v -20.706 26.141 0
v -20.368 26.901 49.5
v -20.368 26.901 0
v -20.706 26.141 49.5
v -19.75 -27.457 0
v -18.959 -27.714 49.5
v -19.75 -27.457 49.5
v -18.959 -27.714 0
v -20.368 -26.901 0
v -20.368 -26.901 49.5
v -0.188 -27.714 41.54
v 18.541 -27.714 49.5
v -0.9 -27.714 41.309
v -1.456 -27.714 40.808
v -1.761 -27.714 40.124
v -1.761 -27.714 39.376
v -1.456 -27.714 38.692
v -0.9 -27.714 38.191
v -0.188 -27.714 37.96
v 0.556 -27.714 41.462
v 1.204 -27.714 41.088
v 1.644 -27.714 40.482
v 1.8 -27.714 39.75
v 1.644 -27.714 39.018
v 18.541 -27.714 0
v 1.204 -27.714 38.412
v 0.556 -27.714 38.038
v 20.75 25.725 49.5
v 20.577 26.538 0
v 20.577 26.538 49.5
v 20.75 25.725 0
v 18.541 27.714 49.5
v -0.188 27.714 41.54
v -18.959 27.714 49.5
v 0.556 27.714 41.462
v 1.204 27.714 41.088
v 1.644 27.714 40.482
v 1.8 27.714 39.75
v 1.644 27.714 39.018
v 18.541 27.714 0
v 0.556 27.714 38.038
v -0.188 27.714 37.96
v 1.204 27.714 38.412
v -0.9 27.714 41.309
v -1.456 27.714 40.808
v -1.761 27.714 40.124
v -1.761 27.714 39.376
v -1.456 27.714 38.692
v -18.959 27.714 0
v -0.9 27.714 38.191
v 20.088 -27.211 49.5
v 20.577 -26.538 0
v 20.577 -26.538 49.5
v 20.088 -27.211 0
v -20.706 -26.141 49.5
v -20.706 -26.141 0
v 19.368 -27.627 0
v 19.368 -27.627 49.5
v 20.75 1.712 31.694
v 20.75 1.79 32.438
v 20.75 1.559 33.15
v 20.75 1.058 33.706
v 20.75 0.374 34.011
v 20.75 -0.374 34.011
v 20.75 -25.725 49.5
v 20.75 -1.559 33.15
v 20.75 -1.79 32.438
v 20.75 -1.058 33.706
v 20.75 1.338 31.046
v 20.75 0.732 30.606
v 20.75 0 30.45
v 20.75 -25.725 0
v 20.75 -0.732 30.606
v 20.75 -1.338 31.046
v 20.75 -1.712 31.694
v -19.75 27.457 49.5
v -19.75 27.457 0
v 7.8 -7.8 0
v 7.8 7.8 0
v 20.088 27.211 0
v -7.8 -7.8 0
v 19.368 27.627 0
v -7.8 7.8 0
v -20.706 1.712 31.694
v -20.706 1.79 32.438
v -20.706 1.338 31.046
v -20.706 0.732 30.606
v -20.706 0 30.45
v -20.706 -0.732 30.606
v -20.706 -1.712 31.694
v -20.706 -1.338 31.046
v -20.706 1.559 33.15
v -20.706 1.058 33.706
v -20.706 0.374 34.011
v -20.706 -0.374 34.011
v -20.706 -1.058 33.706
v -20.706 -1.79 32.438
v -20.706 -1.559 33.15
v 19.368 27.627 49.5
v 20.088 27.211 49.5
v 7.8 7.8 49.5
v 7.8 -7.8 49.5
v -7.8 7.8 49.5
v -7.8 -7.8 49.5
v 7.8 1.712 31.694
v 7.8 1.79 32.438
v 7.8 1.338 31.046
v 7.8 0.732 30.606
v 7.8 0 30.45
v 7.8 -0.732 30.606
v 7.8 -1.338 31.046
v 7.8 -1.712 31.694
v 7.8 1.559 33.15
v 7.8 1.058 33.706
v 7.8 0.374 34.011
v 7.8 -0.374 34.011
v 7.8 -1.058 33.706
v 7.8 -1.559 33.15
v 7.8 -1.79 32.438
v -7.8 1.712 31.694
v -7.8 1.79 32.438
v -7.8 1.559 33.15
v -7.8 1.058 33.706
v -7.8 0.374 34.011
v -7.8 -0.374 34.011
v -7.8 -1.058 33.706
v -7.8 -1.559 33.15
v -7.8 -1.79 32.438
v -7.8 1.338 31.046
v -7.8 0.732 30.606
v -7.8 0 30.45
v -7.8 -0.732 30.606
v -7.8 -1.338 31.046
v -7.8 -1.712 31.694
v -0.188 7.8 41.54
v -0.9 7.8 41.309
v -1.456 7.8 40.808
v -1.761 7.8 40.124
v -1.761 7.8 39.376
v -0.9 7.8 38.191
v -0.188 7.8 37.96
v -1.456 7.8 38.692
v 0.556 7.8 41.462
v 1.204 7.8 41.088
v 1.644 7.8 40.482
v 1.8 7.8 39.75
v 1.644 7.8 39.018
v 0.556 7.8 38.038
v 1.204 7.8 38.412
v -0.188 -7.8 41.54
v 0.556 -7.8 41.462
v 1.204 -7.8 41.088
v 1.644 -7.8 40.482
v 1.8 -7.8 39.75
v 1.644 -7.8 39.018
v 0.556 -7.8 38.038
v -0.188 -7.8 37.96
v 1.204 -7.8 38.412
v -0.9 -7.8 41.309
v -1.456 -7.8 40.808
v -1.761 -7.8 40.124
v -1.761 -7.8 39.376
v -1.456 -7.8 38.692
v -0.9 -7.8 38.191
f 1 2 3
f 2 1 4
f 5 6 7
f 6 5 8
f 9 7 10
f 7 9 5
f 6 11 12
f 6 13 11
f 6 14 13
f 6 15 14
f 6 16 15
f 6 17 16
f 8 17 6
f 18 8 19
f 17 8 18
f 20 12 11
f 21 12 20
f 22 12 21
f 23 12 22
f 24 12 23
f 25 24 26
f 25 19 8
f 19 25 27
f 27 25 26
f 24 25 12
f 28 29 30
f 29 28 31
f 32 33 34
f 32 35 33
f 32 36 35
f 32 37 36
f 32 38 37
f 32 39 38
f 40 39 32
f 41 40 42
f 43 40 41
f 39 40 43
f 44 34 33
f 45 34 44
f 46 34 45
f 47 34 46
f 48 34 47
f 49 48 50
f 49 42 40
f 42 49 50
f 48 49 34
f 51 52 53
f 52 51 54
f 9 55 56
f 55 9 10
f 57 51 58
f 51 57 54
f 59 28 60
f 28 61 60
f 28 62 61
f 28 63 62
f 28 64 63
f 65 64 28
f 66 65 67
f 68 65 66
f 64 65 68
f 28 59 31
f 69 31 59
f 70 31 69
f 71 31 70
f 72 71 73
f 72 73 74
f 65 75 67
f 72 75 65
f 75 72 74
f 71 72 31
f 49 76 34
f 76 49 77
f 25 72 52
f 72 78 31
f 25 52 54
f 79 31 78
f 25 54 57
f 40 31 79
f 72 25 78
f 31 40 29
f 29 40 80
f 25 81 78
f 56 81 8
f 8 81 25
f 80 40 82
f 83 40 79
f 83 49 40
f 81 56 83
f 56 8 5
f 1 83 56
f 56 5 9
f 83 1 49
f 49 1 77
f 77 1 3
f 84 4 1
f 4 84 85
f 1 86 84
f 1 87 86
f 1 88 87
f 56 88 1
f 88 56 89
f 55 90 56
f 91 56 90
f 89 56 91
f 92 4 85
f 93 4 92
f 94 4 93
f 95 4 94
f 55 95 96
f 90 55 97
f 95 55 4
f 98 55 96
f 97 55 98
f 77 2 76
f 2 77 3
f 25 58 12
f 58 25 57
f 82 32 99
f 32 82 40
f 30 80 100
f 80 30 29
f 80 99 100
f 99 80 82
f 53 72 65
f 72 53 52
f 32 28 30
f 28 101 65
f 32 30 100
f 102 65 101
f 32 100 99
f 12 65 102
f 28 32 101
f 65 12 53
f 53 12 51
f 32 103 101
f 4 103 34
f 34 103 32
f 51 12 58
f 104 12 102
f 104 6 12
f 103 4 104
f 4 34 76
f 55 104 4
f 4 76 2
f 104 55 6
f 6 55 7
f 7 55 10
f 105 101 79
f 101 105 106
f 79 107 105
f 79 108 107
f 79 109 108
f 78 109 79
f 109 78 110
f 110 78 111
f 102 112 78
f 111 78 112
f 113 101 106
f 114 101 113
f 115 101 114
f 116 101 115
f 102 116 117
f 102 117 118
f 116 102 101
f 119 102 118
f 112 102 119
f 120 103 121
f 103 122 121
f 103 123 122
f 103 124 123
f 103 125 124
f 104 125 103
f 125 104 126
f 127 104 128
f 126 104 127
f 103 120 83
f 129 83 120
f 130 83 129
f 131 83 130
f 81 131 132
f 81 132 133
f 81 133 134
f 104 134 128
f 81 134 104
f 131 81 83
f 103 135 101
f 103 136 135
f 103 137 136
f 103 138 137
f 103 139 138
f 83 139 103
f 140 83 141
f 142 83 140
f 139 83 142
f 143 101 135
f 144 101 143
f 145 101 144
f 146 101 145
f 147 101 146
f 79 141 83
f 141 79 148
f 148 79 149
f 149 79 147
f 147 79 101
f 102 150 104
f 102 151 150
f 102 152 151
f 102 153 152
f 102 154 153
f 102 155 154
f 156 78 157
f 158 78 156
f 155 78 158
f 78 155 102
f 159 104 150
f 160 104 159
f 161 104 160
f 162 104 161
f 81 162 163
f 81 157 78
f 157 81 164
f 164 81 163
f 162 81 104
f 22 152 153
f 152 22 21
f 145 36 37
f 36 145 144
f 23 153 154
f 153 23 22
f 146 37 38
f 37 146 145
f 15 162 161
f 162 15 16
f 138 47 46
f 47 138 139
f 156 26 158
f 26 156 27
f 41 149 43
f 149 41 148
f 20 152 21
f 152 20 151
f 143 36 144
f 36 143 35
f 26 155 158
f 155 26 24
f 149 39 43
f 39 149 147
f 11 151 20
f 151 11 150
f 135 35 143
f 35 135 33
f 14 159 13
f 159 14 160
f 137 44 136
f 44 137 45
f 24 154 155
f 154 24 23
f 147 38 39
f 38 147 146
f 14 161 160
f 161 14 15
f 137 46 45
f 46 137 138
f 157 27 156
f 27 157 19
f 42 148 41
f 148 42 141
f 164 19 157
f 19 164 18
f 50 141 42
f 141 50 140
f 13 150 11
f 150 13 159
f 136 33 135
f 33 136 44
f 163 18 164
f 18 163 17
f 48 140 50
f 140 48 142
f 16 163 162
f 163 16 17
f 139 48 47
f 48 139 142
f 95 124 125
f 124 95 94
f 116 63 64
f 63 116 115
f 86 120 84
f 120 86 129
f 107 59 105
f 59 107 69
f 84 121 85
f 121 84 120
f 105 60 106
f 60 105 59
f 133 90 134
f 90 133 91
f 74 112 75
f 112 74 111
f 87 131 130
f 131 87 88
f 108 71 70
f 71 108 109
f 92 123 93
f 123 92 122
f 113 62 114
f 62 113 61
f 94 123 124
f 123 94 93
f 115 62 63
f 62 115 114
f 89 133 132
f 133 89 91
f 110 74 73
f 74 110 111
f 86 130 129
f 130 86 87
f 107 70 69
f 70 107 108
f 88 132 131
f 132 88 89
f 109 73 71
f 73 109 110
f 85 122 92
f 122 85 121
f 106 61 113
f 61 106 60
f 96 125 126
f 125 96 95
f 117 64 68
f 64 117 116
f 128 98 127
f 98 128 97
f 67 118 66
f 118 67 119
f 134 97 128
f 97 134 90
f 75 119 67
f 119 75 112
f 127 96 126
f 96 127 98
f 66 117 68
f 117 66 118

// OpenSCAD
open_beam = 15; //open beam dimensions (square)
perspex_width = 5;
bearing_od = 22;
bearing_id = 8;
hole_space = 65.673;//hole spacing on perspex round plate
hole_to_front_edge = 13;
r_corners = 3;
plate_thickness = 4;
extrusion=0.3;

//variables for thingiverse obtained cylinder rounding tool
pad = 0.1;	// Padding to maintain manifold
ch = 15;
cr = 25;
ct = 1;
r = 10;
smooth = 180;	// Number of facets of rounding cylinder
//variables for edge fillet
b = 13;
h = 20;
w = 90*0.5888888+r_corners;

//===========================================================================================
//===========================================================================================

module plate_fixture(length, thickness){
	difference(){
		hull(){
			translate([length/2, (length*0.5888)/2, 0])cylinder(r=r_corners, h=thickness, $fn=15);
			translate([-length/2, (length*0.5888)/2, 0])cylinder(r=r_corners, h=thickness, $fn=15);
			translate([-(length*0.722)/2, -(length*0.5888)/2, 0])cylinder(r=r_corners, h=thickness, $fn=15);
			translate([(length*0.722)/2, -(length*0.5888)/2, 0])cylinder(r=r_corners, h=thickness, $fn=15);

		}
		union(){
			translate([(hole_space)/2-1.6, (length*0.5888)/2-13+r_corners, -1])cylinder(r=1.6+extrusion, h=thickness+2, $fn=15);
			translate([(-hole_space)/2+1.6, (length*0.5888)/2-13+r_corners, -1])cylinder(r=1.6+extrusion, h=thickness+2, $fn=15);
			translate([(hole_space)/2-1.6, -(length*0.5888)/2+13-r_corners, -1])cylinder(r=1.6+extrusion, h=thickness+2, $fn=15);
			translate([(-hole_space)/2+1.6, -(length*0.5888)/2+13-r_corners, -1])cylinder(r=1.6+extrusion, h=thickness+2, $fn=15);
		}
	}
}
//===========================================================================================
//===========================================================================================
module bearing_slot(od, id, width, length){
	rotate([90,0,0])
	translate([0, -plate_thickness/2, -(length*0.5888)/2-r_corners])
	//difference(){
		cylinder(d=od+extrusion*2.5, h=width*2+1);
		//cylinder(d=id, h=width);
	//}
}
//===========================================================================================
//===========================================================================================
module reinforcement(length){
	rotate([90,0,0])
	translate([0, -plate_thickness/2, -(length*0.5888)/2-r_corners])
	cylinder(r=23.5, h=(length*0.5888)+2*r_corners);
	}
//===========================================================================================
//===========================================================================================
module top_half(){
translate([0, 0, -100])
cube(size=[200, 200, 200], center=true);

}
//===========================================================================================
//===========================================================================================
module bot_half(){
translate([0, 0, 100])
cube(size=[200, 200, 200], center=true);

}
//===========================================================================================
//===========================================================================================
module cylinder_fillet(){
	// Inside Fillet
	translate([0, -90*0.65/2, 0])
	rotate([-90, 0, 0])
	difference() {
		rotate_extrude(convexity=10,  $fn = smooth)
			translate([cr-ct-r+pad,ct-pad,0])
				square(r+pad,r+pad);
		rotate_extrude(convexity=10,  $fn = smooth)
			translate([cr-ct-r,ct+r,0])
				circle(r=r,$fn=smooth);
	}


}
//===========================================================================================
//===========================================================================================
module open_beam_slot(ob_dim, ob_h){//open beam fixture on lower bearing lock (ob_dim = width and length of open beam extrusion)
	translate([0, 0, ob_dim/2*ob_h])
	difference(){
		difference(){
			translate([-(ob_dim+ob_dim/3*2)/2, -(ob_dim+ob_dim/3*2)/2, 0])
			minkowski(){
				cube([ob_dim+ob_dim*1.5, ob_dim+ob_dim*2.43, ob_dim*ob_h], center = true);
				translate([(ob_dim+ob_dim/3*2)/2, (ob_dim+ob_dim/3*2)/2, 0])cylinder(r=2, h=0.000005, center = true, $fn=15);
			}
			cube([ob_dim+extrusion*2, ob_dim+extrusion*2, ob_dim*ob_h+3], center=true);
		}
		
		union(){
		translate([0, 0, ob_dim])
		rotate([90, 0, 0])cylinder(r=1.5+extrusion, h=ob_dim*ob_h+100, center = true, $fn=15);
		translate([0, 0, ob_dim]/2)
		rotate([0, 90, 0])cylinder(r=1.5+extrusion, h=ob_dim*ob_h+100, center = true, $fn=15);
		}
	}
}
//===========================================================================================
//===========================================================================================
module edge_fillet(){
	//Start with an extruded triangle

	rotate(a=[90,-90,0])
		difference(){
			linear_extrude(height = w, center = true, convexity = 10, twist = 0)
				polygon(points=[[0,0],[h,0],[0,b]], paths=[[0,1,2]]);
			translate([h-1, b-1, -w/2])cylinder(r=15, h=w, $fn=30);
		}

}

//===========================================================================================
// 												MAIN
//===========================================================================================

module main(){
	difference(){	
	difference(){
		union(){
			translate([0, 0, -5-plate_thickness])plate_fixture(90-2*r_corners);
			plate_fixture(90-2*r_corners, 4);
			//difference(){
				reinforcement(90-2*r_corners);
				//cylinder_fillet();
			//}
			open_beam_slot(15, 3.3);
		}
		bearing_slot(bearing_od, bearing_id, 7, 90-2*r_corners);

	}
	top_half();
	}
}

open_beam_slot(15, 3.3);
/*
main();
intersection(){
plate_fixture(90-2*r_corners, 20);
translate([-20, 0, -0.2])
edge_fillet();
}

intersection(){
plate_fixture(90-2*r_corners, 20);
rotate([0, 0, 180])
translate([-20, 0, -0.2])
edge_fillet();
}
*/
